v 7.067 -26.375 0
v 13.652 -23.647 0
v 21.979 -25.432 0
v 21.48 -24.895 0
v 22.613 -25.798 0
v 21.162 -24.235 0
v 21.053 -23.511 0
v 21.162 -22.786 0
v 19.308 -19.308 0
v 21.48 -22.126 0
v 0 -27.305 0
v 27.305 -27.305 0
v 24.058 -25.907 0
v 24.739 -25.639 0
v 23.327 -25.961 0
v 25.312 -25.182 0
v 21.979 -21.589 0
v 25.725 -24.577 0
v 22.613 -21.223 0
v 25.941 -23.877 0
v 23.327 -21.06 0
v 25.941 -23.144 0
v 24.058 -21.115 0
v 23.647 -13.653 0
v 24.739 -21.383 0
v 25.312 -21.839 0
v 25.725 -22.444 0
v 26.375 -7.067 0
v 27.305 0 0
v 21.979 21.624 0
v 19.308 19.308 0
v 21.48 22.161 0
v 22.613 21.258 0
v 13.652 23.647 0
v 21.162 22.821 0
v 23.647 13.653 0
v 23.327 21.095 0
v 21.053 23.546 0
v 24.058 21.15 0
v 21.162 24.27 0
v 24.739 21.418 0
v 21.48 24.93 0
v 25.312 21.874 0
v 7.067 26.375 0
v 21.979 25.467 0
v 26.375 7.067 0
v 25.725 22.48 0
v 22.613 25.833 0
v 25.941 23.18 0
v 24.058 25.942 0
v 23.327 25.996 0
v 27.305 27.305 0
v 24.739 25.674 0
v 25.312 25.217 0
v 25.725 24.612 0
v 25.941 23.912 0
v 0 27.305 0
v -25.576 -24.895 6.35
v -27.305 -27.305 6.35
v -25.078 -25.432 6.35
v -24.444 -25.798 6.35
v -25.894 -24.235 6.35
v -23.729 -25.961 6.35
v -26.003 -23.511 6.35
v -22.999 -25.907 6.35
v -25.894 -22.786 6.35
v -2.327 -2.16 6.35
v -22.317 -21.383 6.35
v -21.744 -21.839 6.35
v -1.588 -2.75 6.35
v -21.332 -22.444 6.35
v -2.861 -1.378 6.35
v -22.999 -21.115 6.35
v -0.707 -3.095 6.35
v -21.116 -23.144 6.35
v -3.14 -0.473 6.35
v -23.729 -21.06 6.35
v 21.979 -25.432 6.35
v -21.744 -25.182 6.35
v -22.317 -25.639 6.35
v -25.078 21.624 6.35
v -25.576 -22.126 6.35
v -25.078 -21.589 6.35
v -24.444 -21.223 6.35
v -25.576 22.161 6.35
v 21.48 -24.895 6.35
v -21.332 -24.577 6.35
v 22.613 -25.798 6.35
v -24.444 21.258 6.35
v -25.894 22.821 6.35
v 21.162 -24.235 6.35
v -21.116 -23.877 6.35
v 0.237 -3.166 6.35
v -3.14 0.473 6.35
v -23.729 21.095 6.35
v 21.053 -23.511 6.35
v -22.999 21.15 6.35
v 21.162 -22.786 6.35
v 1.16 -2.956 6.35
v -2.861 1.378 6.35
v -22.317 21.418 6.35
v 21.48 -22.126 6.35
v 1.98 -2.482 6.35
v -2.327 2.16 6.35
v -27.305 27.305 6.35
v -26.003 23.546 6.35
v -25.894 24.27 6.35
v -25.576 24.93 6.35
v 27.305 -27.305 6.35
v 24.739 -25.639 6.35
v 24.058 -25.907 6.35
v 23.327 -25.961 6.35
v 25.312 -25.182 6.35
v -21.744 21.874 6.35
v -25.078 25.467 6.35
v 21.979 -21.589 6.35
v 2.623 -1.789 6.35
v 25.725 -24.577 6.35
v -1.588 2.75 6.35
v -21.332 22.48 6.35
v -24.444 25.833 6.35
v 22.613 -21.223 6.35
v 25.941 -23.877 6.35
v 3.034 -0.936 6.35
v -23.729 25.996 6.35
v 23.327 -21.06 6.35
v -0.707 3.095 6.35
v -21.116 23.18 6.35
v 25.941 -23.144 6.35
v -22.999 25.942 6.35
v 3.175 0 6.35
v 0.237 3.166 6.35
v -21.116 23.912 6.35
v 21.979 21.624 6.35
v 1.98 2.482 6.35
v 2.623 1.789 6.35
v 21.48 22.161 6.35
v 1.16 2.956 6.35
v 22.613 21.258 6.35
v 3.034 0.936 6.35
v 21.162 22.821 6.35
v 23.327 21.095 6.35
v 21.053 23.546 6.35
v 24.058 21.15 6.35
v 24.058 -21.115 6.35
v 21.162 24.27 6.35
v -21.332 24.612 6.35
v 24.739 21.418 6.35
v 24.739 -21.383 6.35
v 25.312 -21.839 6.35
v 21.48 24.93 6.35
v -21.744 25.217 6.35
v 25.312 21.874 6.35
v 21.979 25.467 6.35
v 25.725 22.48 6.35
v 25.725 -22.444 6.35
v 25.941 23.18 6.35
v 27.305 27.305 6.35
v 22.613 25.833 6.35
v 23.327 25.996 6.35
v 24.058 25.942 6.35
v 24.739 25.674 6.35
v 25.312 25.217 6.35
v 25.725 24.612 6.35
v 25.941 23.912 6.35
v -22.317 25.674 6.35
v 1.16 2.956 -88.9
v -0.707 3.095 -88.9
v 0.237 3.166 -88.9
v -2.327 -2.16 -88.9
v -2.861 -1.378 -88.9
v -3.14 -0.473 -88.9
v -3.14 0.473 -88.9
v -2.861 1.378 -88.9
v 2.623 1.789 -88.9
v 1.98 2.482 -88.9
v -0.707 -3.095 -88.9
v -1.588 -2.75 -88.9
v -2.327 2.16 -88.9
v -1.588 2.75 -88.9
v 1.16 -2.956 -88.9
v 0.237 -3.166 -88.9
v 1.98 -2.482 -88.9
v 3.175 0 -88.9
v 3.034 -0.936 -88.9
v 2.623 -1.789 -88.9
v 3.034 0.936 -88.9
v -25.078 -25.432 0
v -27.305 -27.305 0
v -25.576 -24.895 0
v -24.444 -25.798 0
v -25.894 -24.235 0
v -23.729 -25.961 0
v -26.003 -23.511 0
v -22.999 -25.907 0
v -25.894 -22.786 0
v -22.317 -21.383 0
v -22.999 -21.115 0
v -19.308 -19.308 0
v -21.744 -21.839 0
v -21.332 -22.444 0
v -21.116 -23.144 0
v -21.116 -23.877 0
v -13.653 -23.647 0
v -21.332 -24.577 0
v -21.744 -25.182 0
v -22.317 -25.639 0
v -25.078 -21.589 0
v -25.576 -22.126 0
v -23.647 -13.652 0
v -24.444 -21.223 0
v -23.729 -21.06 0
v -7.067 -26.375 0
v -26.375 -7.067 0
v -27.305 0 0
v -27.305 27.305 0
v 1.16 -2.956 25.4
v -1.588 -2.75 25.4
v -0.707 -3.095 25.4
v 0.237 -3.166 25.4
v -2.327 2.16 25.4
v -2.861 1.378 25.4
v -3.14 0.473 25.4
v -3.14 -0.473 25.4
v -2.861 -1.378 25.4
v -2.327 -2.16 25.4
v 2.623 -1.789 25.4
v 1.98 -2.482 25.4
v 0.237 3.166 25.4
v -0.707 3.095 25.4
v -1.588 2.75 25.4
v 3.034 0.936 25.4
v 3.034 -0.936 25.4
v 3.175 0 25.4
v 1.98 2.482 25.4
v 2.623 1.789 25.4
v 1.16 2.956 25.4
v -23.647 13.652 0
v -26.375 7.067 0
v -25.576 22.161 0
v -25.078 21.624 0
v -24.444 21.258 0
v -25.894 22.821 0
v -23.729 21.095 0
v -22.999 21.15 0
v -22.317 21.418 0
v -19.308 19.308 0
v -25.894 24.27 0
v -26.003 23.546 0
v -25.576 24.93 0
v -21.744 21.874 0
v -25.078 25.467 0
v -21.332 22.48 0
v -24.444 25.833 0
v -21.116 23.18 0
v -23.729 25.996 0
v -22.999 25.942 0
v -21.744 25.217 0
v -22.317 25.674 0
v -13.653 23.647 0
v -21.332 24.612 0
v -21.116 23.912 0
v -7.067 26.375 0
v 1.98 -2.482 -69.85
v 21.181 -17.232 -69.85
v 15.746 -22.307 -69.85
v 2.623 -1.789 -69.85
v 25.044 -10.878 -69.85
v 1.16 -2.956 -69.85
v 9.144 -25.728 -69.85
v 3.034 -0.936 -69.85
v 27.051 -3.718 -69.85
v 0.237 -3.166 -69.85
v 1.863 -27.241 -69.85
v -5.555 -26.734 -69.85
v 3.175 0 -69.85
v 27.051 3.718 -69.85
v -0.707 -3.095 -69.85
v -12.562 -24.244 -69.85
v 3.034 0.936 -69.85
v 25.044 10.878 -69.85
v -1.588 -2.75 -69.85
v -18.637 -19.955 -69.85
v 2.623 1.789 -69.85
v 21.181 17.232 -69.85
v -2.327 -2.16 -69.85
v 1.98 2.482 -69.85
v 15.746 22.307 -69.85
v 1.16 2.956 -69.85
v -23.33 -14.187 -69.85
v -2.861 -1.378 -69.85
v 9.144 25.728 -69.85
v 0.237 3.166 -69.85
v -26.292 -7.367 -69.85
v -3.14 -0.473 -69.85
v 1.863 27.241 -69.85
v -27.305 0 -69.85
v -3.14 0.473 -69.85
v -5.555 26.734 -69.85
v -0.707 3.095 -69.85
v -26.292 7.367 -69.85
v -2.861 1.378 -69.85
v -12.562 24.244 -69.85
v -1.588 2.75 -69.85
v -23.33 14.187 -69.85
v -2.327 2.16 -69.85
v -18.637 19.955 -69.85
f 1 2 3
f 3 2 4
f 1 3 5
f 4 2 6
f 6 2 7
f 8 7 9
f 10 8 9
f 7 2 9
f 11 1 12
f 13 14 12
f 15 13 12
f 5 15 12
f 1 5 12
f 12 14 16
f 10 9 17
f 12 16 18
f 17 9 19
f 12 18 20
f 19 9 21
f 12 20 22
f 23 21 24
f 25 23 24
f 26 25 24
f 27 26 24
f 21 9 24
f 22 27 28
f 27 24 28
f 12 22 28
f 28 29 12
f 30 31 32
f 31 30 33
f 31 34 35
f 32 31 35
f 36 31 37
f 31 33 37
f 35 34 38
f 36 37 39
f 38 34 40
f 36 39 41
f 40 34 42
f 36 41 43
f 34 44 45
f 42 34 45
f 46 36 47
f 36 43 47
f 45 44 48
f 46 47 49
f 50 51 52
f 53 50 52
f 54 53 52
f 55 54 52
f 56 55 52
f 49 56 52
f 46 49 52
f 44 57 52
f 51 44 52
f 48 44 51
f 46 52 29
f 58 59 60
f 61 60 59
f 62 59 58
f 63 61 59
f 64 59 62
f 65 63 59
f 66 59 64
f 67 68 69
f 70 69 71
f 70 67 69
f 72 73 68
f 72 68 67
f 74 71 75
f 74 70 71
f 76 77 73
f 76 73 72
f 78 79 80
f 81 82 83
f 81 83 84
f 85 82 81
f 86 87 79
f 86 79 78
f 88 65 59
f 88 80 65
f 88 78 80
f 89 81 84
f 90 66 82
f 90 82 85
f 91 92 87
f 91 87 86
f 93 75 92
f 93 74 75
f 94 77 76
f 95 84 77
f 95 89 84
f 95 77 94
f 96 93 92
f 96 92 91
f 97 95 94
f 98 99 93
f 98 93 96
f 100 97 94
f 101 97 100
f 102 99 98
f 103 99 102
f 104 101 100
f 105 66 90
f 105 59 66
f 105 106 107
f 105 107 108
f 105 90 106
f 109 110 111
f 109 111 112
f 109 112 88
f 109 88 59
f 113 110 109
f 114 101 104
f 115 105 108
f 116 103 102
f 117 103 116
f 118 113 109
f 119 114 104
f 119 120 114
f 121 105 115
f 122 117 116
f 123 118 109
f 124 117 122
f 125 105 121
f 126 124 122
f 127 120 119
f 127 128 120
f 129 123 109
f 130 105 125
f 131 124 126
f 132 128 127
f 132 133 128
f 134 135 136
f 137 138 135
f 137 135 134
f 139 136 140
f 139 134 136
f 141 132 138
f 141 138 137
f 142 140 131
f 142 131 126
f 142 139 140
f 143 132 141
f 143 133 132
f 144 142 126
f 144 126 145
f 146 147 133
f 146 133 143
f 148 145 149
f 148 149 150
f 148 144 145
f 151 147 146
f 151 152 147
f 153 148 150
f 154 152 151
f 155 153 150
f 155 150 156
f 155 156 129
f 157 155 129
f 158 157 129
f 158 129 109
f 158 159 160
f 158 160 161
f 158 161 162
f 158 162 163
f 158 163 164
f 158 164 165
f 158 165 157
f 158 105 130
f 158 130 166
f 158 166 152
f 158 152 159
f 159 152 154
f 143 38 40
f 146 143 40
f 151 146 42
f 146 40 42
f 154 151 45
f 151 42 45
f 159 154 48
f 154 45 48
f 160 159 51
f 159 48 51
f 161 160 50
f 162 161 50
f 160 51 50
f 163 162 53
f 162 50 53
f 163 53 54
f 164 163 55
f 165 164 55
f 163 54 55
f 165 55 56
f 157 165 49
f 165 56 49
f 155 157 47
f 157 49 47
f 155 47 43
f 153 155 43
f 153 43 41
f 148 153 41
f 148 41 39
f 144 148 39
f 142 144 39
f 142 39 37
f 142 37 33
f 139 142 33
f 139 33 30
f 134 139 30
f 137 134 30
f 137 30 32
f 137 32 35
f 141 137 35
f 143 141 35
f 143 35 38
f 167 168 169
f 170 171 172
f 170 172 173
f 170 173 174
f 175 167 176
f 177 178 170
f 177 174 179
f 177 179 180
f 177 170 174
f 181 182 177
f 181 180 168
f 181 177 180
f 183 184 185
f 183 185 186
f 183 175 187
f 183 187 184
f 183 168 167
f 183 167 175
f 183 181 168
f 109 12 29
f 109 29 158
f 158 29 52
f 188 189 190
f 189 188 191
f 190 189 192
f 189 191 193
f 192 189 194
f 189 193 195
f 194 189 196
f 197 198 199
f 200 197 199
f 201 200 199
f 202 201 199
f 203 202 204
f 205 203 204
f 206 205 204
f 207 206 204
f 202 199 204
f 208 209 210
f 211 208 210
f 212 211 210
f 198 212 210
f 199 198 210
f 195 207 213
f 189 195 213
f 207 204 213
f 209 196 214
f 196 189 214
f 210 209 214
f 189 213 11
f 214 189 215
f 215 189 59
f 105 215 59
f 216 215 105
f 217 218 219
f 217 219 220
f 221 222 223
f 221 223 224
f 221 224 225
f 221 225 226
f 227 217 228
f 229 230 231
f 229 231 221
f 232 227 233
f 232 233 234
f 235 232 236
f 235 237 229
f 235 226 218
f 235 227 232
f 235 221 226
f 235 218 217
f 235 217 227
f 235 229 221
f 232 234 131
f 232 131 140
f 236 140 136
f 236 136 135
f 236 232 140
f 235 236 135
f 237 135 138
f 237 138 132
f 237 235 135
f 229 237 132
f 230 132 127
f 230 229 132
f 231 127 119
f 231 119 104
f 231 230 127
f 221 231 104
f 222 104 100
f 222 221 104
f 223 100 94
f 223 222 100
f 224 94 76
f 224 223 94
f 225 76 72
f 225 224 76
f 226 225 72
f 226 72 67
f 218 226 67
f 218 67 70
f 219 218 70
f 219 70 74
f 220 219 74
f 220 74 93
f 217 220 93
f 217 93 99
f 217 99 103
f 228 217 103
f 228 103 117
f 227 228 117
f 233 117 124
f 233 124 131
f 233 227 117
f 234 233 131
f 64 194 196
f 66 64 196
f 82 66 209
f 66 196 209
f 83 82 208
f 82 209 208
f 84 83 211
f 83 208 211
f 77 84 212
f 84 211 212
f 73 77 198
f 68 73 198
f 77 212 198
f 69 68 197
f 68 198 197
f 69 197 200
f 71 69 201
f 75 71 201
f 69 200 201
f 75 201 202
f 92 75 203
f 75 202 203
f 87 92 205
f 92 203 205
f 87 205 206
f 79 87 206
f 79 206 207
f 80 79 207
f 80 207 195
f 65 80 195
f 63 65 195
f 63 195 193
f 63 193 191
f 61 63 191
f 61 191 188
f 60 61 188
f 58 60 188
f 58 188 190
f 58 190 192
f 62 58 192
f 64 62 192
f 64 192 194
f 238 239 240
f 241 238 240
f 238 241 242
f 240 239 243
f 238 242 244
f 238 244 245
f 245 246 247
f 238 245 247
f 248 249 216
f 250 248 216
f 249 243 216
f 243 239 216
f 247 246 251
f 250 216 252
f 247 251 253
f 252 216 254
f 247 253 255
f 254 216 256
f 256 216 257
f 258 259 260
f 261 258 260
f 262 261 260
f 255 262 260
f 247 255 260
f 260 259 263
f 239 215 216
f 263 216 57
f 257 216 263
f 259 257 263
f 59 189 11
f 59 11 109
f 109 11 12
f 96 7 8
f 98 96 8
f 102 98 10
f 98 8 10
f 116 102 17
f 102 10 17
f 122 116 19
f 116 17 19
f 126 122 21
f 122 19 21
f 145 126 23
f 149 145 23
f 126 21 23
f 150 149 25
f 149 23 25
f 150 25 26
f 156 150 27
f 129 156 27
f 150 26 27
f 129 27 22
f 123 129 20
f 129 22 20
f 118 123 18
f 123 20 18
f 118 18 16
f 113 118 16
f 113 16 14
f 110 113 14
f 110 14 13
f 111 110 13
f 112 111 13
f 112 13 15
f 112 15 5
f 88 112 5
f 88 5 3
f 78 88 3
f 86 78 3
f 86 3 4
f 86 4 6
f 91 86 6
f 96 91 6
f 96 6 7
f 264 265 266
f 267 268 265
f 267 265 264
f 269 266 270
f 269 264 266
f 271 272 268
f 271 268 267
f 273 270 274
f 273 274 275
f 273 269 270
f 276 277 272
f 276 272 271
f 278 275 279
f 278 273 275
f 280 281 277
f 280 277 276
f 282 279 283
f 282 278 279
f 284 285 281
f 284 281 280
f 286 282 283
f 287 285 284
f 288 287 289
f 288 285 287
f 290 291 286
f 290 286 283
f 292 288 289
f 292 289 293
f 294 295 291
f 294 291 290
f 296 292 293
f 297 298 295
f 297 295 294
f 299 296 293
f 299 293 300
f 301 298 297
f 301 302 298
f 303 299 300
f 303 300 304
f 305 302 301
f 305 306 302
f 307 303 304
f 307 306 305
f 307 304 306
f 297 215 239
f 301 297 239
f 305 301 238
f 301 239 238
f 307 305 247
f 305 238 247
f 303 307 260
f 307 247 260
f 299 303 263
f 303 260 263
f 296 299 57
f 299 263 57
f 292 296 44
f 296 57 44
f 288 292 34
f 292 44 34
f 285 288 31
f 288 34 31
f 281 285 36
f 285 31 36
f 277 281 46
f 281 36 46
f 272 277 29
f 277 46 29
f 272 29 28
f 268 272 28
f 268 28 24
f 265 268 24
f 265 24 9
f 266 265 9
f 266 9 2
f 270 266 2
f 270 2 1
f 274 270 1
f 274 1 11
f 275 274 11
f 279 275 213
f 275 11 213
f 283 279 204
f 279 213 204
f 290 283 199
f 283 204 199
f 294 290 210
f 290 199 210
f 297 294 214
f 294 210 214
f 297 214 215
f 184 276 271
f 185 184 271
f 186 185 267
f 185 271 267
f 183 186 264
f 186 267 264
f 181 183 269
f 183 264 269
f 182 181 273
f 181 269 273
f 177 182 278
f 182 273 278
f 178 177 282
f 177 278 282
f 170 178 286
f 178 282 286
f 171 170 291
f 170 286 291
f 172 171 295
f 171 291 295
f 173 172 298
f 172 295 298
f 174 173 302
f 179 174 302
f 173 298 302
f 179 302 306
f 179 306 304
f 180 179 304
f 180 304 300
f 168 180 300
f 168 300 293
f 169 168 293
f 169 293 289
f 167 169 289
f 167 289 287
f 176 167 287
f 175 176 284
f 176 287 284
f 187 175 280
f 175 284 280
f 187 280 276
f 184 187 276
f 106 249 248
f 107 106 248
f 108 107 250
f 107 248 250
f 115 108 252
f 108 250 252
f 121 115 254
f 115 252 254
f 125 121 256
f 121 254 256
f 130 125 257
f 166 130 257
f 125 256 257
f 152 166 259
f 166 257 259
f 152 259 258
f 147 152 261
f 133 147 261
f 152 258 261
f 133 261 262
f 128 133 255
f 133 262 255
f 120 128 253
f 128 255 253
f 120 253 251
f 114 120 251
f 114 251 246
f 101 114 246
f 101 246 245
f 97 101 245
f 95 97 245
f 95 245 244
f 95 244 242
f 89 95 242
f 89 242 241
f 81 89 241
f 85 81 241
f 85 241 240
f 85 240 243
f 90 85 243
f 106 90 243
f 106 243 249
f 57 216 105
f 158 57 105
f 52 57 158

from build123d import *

# Parameters (mm, degrees)
SKETCH1_W                    = 54.61
SKETCH1_H                    = 54.61
BOSS_EXTRUDE1_DEPTH          = 6.35
F_10_0_1935_DIAMETER_HOLE1_D = 4.9149
SKETCH7_R                    = 27.305
BOSS_EXTRUDE2_DEPTH          = 69.85
SKETCH8_R                    = 3.175
BOSS_EXTRUDE3_DEPTH          = 19.05
BOSS_EXTRUDE4_START          = 19.05
SKETCH9_R                    = 3.175
BOSS_EXTRUDE4_DEPTH          = 19.05


with BuildPart() as part:
    # Sketch1 → Boss-Extrude1 (new body)
    with BuildSketch(Plane.XY):
        Rectangle(SKETCH1_W, SKETCH1_H)
    extrude(amount=BOSS_EXTRUDE1_DEPTH)

    # #10 (0.1935) Diameter Hole1 (through all)
    with Locations(Plane.XY.offset(6.35)):
        with Locations((-23.5458, 23.5458), (23.510742074, 23.5458), (23.510742074, -23.510742074), (-23.5458, -23.510742074)):
            Hole(F_10_0_1935_DIAMETER_HOLE1_D / 2)

    # Sketch7 → Boss-Extrude2 (add)
    with BuildSketch(Plane(origin=(0, 0, 0), x_dir=(-1, 0, 0), z_dir=(0, 0, -1))):
        Circle(SKETCH7_R)
    extrude(amount=BOSS_EXTRUDE2_DEPTH)

    # Sketch8 → Boss-Extrude3 (add)
    with BuildSketch(Plane(origin=(0, 0, -69.85), x_dir=(-1, 0, 0), z_dir=(0, 0, -1))):
        with Locations(Location((0, 0, 0), (0, 0, 180))):
            Circle(SKETCH8_R)
    extrude(amount=BOSS_EXTRUDE3_DEPTH)

    # Sketch9 → Boss-Extrude4 (add)
    with BuildSketch(Plane.XY.offset(6.35).offset(BOSS_EXTRUDE4_START)):
        Circle(SKETCH9_R)
    extrude(amount=-BOSS_EXTRUDE4_DEPTH)


solid = part.part
